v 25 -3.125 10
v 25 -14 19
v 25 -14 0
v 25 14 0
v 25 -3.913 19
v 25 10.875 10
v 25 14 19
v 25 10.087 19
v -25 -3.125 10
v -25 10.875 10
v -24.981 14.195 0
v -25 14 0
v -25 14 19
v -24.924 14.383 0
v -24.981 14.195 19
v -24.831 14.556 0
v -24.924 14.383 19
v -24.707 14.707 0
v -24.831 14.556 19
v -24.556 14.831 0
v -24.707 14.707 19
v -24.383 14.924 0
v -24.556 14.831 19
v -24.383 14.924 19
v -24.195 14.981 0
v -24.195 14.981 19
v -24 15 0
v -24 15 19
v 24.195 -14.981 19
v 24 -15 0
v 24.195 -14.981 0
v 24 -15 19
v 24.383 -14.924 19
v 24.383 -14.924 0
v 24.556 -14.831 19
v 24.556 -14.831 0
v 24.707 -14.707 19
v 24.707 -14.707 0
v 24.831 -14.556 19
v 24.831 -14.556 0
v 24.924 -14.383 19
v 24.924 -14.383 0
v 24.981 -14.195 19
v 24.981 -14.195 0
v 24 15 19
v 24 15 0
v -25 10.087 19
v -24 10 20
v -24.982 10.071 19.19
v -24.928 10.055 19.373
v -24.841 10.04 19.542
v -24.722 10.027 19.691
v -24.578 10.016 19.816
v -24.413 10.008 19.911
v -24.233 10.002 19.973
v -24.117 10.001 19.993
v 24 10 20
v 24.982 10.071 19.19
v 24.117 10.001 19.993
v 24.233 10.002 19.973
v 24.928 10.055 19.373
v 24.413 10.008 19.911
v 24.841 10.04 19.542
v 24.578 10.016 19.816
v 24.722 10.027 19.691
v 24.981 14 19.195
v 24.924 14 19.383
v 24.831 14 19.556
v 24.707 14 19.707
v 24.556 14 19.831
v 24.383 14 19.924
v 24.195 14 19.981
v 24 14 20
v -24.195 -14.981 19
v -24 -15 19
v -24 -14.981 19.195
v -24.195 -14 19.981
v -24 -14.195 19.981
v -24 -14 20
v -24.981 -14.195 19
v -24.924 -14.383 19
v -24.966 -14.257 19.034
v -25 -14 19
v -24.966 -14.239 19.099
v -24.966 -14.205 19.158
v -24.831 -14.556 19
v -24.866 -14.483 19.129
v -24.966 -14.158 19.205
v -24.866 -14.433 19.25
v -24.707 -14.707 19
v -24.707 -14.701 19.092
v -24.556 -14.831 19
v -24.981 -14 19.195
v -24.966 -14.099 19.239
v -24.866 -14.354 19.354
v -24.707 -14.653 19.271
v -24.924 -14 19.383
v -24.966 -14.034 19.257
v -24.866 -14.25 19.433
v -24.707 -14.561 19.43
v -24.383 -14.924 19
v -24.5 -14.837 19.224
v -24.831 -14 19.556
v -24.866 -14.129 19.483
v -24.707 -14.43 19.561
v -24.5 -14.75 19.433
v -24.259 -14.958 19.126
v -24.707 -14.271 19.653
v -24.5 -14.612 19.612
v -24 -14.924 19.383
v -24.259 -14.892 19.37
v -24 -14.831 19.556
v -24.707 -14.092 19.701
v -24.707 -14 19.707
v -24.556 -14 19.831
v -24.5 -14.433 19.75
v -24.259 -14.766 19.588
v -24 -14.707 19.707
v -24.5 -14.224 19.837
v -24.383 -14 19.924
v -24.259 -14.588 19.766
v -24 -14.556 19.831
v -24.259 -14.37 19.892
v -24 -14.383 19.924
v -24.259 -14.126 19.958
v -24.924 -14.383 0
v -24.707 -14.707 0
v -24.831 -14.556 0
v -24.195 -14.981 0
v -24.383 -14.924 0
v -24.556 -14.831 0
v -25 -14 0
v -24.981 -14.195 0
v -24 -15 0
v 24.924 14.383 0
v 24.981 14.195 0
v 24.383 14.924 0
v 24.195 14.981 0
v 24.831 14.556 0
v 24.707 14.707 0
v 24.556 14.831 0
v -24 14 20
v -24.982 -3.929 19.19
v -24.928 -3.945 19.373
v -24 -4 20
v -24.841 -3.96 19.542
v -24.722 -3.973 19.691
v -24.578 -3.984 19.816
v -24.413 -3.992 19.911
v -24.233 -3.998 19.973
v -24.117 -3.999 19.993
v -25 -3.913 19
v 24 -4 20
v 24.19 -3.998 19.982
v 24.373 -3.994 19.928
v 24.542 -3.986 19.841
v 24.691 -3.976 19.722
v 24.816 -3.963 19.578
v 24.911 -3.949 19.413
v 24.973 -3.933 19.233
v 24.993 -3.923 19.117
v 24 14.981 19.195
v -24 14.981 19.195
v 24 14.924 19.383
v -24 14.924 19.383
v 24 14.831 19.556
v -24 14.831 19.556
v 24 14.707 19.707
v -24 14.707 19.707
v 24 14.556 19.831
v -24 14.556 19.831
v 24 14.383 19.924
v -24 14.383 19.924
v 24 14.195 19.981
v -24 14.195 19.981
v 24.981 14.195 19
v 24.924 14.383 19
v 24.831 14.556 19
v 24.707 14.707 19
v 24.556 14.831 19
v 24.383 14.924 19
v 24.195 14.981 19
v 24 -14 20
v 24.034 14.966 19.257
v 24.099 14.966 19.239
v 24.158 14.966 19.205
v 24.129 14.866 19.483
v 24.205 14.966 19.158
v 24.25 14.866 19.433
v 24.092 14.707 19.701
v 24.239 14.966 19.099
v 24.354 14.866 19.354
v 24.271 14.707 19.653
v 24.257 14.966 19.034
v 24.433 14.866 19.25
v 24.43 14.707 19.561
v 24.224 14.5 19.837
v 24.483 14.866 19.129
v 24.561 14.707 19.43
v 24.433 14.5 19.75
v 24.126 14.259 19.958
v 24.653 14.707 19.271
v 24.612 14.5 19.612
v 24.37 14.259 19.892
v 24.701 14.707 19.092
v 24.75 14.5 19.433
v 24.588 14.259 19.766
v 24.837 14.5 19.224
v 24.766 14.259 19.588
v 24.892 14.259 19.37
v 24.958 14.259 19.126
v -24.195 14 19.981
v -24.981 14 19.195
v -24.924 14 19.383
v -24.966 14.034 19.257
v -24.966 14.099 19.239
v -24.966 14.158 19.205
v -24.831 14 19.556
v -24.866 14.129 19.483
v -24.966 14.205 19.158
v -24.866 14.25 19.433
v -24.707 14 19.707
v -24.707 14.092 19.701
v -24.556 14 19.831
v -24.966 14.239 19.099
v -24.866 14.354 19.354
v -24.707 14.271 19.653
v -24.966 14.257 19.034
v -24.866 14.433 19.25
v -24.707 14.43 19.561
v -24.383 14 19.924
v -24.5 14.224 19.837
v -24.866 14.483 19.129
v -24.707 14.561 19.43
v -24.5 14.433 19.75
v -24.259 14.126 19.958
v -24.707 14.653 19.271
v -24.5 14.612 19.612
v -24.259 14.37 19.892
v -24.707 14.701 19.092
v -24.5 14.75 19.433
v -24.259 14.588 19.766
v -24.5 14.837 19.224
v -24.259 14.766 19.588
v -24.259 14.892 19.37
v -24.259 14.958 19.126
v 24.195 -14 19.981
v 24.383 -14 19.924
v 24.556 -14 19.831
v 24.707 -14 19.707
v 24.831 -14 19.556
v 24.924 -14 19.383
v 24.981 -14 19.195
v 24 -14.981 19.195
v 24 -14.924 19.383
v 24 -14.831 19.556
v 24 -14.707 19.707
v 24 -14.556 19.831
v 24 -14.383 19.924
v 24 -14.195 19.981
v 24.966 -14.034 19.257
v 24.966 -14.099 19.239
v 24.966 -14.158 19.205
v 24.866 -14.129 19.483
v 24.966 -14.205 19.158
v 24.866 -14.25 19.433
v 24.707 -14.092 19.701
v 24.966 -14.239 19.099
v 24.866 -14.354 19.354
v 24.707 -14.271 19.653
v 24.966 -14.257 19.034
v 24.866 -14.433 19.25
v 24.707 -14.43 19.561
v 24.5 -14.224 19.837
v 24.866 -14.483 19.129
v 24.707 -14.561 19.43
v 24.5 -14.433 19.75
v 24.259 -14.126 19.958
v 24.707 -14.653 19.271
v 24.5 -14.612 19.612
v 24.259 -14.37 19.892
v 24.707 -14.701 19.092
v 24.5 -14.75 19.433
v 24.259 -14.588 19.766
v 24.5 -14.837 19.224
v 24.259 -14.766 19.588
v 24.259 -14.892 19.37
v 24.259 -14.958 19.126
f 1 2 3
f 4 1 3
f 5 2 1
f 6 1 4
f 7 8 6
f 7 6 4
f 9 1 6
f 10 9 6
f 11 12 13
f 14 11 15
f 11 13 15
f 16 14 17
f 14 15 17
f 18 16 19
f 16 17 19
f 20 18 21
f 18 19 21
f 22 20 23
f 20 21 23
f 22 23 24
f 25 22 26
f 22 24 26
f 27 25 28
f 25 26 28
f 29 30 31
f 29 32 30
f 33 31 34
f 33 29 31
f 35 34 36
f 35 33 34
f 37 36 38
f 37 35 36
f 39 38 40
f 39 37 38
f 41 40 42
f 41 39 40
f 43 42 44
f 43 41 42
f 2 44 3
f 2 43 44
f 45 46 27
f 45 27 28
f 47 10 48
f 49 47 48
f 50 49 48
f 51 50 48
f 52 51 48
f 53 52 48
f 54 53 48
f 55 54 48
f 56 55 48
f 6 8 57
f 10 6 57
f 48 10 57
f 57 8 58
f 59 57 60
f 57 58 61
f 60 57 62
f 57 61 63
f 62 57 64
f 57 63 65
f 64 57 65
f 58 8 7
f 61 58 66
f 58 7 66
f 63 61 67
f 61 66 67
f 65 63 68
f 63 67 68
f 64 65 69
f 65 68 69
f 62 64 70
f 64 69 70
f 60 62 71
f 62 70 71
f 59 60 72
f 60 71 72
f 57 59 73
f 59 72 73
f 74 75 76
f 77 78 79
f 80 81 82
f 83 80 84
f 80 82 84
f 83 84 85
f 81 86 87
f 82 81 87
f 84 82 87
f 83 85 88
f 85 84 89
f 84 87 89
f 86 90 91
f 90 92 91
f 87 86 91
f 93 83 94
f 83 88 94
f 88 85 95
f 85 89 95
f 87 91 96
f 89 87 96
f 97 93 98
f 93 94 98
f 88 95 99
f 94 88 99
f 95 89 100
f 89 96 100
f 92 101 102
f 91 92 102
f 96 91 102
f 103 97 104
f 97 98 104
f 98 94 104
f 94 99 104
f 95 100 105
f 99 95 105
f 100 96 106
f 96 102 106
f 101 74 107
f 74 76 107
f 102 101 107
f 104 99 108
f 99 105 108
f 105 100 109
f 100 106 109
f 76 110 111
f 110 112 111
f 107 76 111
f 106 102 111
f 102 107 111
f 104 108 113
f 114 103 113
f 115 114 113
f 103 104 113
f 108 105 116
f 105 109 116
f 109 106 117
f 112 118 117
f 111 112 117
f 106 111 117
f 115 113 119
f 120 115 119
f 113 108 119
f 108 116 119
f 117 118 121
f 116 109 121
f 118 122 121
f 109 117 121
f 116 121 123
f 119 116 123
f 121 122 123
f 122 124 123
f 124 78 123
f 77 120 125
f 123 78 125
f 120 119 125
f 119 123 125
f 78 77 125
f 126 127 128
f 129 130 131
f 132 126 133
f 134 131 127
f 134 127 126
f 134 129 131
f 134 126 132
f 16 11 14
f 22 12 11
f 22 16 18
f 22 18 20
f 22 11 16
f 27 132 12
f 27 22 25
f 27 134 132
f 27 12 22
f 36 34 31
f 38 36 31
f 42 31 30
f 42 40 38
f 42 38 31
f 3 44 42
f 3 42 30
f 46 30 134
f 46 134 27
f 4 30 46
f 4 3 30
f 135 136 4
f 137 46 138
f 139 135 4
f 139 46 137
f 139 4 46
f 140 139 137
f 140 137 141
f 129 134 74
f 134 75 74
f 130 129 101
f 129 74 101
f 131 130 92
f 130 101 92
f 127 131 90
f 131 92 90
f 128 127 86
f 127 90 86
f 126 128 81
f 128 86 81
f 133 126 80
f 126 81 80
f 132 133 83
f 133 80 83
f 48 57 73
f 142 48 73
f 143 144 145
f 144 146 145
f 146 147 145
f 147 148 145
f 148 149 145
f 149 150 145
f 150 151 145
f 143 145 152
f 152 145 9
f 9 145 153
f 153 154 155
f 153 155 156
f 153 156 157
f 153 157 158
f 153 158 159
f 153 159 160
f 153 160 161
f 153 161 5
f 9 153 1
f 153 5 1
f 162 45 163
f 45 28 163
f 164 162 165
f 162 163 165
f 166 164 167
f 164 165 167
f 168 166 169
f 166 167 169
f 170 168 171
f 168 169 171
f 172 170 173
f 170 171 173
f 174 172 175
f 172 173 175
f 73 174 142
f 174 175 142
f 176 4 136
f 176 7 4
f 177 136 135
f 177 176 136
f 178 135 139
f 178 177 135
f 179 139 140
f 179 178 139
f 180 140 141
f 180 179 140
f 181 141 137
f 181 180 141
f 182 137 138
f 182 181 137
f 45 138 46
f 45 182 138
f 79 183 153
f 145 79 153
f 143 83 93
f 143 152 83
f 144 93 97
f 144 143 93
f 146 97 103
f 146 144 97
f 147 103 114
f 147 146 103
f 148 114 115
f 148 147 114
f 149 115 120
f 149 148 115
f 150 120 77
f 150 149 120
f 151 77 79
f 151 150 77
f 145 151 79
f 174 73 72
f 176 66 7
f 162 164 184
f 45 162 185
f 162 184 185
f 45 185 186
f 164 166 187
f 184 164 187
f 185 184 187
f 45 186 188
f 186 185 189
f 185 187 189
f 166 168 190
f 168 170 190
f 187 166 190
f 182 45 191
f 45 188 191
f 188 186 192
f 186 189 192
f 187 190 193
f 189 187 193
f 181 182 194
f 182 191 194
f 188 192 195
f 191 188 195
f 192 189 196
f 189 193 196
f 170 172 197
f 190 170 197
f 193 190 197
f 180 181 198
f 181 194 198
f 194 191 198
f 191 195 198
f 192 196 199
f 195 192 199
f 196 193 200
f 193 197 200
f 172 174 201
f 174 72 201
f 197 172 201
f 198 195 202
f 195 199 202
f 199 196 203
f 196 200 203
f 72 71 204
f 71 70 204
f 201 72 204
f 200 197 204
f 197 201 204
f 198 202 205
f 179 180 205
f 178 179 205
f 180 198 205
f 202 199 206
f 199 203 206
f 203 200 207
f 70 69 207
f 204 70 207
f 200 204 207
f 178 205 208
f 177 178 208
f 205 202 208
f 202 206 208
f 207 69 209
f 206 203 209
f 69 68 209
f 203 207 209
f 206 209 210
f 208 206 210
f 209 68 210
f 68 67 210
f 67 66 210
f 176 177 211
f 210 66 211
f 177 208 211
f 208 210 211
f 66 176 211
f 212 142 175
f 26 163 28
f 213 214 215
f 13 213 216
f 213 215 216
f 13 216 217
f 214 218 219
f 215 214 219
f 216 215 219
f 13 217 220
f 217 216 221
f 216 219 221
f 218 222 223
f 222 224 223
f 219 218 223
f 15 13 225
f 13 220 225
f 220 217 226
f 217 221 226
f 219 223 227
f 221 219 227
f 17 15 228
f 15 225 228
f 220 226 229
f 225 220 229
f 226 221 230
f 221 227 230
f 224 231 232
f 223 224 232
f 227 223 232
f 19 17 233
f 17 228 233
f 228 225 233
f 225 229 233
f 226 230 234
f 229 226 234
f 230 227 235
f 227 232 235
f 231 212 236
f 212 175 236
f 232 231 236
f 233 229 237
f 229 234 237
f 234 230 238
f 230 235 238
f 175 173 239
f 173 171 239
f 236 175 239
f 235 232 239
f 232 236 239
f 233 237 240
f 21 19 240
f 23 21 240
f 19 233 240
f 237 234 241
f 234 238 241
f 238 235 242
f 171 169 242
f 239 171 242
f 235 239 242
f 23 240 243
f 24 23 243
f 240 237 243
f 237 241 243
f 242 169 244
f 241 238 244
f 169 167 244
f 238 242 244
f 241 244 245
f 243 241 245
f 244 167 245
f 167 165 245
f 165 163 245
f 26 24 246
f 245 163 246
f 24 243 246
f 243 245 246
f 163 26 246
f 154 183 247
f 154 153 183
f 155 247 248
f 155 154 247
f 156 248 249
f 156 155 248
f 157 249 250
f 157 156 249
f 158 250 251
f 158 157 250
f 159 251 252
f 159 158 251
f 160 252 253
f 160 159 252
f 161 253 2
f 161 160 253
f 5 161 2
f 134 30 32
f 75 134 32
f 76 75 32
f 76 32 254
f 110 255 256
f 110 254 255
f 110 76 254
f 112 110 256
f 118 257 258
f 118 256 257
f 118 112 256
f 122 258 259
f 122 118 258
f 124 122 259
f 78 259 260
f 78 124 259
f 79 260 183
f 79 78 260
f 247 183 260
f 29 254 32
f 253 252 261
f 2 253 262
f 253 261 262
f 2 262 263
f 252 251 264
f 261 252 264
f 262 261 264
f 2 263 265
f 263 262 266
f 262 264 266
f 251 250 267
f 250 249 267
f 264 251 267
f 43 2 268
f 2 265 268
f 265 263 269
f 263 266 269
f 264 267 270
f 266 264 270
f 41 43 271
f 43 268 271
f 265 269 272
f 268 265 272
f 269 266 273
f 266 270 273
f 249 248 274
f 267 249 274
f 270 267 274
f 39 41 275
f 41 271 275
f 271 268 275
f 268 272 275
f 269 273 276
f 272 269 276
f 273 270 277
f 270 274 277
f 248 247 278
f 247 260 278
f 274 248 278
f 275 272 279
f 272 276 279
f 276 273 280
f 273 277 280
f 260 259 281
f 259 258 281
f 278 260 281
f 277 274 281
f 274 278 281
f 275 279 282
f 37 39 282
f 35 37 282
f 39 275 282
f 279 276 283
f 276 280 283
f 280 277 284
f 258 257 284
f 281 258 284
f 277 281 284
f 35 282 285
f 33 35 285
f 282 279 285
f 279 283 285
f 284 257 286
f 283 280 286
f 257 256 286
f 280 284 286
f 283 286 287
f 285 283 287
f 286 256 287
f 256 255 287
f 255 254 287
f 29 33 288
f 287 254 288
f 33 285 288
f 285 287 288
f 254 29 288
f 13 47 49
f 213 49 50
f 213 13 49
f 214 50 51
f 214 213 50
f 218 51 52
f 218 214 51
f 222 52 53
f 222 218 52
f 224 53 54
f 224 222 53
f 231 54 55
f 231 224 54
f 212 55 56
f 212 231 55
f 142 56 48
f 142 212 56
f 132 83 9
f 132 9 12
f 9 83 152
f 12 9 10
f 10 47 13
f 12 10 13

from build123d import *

# Parameters (mm, degrees)
F0_W     = 30
F0_H     = 20
F1_DEPTH = 25
F3_DEPTH = 50
F4_R     = 1


with BuildPart() as f1:
    # F0 (on Right) → F1 (new body, symmetric)
    with BuildSketch(Plane.YZ):
        with Locations((0, 10)):
            Rectangle(F0_W, F0_H)
    extrude(amount=F1_DEPTH, both=True)

    # F2 (on face) → F3 (cut)
    with BuildSketch(Plane.YZ.offset(25)):
        Polygon((10.874887, 10), (10, 20), (-4, 20), (-3.125113, 10), align=None)
    extrude(amount=-F3_DEPTH, mode=Mode.SUBTRACT)

    # F4
    f4_edges = [f1.edges().sort_by_distance(p)[0] for p in [
        (0, -15, 20),
        (25, -9.5, 20),
        (25, 12.5, 20),
        (0, 15, 20),
        (25, 15, 10),
        (25, -15, 10),
        (-25, -15, 10),
        (-25, -9.5, 20),
        (-25, 12.5, 20),
        (-25, 15, 10),
    ]]
    fillet(f4_edges, radius=F4_R)


solid = f1.part
